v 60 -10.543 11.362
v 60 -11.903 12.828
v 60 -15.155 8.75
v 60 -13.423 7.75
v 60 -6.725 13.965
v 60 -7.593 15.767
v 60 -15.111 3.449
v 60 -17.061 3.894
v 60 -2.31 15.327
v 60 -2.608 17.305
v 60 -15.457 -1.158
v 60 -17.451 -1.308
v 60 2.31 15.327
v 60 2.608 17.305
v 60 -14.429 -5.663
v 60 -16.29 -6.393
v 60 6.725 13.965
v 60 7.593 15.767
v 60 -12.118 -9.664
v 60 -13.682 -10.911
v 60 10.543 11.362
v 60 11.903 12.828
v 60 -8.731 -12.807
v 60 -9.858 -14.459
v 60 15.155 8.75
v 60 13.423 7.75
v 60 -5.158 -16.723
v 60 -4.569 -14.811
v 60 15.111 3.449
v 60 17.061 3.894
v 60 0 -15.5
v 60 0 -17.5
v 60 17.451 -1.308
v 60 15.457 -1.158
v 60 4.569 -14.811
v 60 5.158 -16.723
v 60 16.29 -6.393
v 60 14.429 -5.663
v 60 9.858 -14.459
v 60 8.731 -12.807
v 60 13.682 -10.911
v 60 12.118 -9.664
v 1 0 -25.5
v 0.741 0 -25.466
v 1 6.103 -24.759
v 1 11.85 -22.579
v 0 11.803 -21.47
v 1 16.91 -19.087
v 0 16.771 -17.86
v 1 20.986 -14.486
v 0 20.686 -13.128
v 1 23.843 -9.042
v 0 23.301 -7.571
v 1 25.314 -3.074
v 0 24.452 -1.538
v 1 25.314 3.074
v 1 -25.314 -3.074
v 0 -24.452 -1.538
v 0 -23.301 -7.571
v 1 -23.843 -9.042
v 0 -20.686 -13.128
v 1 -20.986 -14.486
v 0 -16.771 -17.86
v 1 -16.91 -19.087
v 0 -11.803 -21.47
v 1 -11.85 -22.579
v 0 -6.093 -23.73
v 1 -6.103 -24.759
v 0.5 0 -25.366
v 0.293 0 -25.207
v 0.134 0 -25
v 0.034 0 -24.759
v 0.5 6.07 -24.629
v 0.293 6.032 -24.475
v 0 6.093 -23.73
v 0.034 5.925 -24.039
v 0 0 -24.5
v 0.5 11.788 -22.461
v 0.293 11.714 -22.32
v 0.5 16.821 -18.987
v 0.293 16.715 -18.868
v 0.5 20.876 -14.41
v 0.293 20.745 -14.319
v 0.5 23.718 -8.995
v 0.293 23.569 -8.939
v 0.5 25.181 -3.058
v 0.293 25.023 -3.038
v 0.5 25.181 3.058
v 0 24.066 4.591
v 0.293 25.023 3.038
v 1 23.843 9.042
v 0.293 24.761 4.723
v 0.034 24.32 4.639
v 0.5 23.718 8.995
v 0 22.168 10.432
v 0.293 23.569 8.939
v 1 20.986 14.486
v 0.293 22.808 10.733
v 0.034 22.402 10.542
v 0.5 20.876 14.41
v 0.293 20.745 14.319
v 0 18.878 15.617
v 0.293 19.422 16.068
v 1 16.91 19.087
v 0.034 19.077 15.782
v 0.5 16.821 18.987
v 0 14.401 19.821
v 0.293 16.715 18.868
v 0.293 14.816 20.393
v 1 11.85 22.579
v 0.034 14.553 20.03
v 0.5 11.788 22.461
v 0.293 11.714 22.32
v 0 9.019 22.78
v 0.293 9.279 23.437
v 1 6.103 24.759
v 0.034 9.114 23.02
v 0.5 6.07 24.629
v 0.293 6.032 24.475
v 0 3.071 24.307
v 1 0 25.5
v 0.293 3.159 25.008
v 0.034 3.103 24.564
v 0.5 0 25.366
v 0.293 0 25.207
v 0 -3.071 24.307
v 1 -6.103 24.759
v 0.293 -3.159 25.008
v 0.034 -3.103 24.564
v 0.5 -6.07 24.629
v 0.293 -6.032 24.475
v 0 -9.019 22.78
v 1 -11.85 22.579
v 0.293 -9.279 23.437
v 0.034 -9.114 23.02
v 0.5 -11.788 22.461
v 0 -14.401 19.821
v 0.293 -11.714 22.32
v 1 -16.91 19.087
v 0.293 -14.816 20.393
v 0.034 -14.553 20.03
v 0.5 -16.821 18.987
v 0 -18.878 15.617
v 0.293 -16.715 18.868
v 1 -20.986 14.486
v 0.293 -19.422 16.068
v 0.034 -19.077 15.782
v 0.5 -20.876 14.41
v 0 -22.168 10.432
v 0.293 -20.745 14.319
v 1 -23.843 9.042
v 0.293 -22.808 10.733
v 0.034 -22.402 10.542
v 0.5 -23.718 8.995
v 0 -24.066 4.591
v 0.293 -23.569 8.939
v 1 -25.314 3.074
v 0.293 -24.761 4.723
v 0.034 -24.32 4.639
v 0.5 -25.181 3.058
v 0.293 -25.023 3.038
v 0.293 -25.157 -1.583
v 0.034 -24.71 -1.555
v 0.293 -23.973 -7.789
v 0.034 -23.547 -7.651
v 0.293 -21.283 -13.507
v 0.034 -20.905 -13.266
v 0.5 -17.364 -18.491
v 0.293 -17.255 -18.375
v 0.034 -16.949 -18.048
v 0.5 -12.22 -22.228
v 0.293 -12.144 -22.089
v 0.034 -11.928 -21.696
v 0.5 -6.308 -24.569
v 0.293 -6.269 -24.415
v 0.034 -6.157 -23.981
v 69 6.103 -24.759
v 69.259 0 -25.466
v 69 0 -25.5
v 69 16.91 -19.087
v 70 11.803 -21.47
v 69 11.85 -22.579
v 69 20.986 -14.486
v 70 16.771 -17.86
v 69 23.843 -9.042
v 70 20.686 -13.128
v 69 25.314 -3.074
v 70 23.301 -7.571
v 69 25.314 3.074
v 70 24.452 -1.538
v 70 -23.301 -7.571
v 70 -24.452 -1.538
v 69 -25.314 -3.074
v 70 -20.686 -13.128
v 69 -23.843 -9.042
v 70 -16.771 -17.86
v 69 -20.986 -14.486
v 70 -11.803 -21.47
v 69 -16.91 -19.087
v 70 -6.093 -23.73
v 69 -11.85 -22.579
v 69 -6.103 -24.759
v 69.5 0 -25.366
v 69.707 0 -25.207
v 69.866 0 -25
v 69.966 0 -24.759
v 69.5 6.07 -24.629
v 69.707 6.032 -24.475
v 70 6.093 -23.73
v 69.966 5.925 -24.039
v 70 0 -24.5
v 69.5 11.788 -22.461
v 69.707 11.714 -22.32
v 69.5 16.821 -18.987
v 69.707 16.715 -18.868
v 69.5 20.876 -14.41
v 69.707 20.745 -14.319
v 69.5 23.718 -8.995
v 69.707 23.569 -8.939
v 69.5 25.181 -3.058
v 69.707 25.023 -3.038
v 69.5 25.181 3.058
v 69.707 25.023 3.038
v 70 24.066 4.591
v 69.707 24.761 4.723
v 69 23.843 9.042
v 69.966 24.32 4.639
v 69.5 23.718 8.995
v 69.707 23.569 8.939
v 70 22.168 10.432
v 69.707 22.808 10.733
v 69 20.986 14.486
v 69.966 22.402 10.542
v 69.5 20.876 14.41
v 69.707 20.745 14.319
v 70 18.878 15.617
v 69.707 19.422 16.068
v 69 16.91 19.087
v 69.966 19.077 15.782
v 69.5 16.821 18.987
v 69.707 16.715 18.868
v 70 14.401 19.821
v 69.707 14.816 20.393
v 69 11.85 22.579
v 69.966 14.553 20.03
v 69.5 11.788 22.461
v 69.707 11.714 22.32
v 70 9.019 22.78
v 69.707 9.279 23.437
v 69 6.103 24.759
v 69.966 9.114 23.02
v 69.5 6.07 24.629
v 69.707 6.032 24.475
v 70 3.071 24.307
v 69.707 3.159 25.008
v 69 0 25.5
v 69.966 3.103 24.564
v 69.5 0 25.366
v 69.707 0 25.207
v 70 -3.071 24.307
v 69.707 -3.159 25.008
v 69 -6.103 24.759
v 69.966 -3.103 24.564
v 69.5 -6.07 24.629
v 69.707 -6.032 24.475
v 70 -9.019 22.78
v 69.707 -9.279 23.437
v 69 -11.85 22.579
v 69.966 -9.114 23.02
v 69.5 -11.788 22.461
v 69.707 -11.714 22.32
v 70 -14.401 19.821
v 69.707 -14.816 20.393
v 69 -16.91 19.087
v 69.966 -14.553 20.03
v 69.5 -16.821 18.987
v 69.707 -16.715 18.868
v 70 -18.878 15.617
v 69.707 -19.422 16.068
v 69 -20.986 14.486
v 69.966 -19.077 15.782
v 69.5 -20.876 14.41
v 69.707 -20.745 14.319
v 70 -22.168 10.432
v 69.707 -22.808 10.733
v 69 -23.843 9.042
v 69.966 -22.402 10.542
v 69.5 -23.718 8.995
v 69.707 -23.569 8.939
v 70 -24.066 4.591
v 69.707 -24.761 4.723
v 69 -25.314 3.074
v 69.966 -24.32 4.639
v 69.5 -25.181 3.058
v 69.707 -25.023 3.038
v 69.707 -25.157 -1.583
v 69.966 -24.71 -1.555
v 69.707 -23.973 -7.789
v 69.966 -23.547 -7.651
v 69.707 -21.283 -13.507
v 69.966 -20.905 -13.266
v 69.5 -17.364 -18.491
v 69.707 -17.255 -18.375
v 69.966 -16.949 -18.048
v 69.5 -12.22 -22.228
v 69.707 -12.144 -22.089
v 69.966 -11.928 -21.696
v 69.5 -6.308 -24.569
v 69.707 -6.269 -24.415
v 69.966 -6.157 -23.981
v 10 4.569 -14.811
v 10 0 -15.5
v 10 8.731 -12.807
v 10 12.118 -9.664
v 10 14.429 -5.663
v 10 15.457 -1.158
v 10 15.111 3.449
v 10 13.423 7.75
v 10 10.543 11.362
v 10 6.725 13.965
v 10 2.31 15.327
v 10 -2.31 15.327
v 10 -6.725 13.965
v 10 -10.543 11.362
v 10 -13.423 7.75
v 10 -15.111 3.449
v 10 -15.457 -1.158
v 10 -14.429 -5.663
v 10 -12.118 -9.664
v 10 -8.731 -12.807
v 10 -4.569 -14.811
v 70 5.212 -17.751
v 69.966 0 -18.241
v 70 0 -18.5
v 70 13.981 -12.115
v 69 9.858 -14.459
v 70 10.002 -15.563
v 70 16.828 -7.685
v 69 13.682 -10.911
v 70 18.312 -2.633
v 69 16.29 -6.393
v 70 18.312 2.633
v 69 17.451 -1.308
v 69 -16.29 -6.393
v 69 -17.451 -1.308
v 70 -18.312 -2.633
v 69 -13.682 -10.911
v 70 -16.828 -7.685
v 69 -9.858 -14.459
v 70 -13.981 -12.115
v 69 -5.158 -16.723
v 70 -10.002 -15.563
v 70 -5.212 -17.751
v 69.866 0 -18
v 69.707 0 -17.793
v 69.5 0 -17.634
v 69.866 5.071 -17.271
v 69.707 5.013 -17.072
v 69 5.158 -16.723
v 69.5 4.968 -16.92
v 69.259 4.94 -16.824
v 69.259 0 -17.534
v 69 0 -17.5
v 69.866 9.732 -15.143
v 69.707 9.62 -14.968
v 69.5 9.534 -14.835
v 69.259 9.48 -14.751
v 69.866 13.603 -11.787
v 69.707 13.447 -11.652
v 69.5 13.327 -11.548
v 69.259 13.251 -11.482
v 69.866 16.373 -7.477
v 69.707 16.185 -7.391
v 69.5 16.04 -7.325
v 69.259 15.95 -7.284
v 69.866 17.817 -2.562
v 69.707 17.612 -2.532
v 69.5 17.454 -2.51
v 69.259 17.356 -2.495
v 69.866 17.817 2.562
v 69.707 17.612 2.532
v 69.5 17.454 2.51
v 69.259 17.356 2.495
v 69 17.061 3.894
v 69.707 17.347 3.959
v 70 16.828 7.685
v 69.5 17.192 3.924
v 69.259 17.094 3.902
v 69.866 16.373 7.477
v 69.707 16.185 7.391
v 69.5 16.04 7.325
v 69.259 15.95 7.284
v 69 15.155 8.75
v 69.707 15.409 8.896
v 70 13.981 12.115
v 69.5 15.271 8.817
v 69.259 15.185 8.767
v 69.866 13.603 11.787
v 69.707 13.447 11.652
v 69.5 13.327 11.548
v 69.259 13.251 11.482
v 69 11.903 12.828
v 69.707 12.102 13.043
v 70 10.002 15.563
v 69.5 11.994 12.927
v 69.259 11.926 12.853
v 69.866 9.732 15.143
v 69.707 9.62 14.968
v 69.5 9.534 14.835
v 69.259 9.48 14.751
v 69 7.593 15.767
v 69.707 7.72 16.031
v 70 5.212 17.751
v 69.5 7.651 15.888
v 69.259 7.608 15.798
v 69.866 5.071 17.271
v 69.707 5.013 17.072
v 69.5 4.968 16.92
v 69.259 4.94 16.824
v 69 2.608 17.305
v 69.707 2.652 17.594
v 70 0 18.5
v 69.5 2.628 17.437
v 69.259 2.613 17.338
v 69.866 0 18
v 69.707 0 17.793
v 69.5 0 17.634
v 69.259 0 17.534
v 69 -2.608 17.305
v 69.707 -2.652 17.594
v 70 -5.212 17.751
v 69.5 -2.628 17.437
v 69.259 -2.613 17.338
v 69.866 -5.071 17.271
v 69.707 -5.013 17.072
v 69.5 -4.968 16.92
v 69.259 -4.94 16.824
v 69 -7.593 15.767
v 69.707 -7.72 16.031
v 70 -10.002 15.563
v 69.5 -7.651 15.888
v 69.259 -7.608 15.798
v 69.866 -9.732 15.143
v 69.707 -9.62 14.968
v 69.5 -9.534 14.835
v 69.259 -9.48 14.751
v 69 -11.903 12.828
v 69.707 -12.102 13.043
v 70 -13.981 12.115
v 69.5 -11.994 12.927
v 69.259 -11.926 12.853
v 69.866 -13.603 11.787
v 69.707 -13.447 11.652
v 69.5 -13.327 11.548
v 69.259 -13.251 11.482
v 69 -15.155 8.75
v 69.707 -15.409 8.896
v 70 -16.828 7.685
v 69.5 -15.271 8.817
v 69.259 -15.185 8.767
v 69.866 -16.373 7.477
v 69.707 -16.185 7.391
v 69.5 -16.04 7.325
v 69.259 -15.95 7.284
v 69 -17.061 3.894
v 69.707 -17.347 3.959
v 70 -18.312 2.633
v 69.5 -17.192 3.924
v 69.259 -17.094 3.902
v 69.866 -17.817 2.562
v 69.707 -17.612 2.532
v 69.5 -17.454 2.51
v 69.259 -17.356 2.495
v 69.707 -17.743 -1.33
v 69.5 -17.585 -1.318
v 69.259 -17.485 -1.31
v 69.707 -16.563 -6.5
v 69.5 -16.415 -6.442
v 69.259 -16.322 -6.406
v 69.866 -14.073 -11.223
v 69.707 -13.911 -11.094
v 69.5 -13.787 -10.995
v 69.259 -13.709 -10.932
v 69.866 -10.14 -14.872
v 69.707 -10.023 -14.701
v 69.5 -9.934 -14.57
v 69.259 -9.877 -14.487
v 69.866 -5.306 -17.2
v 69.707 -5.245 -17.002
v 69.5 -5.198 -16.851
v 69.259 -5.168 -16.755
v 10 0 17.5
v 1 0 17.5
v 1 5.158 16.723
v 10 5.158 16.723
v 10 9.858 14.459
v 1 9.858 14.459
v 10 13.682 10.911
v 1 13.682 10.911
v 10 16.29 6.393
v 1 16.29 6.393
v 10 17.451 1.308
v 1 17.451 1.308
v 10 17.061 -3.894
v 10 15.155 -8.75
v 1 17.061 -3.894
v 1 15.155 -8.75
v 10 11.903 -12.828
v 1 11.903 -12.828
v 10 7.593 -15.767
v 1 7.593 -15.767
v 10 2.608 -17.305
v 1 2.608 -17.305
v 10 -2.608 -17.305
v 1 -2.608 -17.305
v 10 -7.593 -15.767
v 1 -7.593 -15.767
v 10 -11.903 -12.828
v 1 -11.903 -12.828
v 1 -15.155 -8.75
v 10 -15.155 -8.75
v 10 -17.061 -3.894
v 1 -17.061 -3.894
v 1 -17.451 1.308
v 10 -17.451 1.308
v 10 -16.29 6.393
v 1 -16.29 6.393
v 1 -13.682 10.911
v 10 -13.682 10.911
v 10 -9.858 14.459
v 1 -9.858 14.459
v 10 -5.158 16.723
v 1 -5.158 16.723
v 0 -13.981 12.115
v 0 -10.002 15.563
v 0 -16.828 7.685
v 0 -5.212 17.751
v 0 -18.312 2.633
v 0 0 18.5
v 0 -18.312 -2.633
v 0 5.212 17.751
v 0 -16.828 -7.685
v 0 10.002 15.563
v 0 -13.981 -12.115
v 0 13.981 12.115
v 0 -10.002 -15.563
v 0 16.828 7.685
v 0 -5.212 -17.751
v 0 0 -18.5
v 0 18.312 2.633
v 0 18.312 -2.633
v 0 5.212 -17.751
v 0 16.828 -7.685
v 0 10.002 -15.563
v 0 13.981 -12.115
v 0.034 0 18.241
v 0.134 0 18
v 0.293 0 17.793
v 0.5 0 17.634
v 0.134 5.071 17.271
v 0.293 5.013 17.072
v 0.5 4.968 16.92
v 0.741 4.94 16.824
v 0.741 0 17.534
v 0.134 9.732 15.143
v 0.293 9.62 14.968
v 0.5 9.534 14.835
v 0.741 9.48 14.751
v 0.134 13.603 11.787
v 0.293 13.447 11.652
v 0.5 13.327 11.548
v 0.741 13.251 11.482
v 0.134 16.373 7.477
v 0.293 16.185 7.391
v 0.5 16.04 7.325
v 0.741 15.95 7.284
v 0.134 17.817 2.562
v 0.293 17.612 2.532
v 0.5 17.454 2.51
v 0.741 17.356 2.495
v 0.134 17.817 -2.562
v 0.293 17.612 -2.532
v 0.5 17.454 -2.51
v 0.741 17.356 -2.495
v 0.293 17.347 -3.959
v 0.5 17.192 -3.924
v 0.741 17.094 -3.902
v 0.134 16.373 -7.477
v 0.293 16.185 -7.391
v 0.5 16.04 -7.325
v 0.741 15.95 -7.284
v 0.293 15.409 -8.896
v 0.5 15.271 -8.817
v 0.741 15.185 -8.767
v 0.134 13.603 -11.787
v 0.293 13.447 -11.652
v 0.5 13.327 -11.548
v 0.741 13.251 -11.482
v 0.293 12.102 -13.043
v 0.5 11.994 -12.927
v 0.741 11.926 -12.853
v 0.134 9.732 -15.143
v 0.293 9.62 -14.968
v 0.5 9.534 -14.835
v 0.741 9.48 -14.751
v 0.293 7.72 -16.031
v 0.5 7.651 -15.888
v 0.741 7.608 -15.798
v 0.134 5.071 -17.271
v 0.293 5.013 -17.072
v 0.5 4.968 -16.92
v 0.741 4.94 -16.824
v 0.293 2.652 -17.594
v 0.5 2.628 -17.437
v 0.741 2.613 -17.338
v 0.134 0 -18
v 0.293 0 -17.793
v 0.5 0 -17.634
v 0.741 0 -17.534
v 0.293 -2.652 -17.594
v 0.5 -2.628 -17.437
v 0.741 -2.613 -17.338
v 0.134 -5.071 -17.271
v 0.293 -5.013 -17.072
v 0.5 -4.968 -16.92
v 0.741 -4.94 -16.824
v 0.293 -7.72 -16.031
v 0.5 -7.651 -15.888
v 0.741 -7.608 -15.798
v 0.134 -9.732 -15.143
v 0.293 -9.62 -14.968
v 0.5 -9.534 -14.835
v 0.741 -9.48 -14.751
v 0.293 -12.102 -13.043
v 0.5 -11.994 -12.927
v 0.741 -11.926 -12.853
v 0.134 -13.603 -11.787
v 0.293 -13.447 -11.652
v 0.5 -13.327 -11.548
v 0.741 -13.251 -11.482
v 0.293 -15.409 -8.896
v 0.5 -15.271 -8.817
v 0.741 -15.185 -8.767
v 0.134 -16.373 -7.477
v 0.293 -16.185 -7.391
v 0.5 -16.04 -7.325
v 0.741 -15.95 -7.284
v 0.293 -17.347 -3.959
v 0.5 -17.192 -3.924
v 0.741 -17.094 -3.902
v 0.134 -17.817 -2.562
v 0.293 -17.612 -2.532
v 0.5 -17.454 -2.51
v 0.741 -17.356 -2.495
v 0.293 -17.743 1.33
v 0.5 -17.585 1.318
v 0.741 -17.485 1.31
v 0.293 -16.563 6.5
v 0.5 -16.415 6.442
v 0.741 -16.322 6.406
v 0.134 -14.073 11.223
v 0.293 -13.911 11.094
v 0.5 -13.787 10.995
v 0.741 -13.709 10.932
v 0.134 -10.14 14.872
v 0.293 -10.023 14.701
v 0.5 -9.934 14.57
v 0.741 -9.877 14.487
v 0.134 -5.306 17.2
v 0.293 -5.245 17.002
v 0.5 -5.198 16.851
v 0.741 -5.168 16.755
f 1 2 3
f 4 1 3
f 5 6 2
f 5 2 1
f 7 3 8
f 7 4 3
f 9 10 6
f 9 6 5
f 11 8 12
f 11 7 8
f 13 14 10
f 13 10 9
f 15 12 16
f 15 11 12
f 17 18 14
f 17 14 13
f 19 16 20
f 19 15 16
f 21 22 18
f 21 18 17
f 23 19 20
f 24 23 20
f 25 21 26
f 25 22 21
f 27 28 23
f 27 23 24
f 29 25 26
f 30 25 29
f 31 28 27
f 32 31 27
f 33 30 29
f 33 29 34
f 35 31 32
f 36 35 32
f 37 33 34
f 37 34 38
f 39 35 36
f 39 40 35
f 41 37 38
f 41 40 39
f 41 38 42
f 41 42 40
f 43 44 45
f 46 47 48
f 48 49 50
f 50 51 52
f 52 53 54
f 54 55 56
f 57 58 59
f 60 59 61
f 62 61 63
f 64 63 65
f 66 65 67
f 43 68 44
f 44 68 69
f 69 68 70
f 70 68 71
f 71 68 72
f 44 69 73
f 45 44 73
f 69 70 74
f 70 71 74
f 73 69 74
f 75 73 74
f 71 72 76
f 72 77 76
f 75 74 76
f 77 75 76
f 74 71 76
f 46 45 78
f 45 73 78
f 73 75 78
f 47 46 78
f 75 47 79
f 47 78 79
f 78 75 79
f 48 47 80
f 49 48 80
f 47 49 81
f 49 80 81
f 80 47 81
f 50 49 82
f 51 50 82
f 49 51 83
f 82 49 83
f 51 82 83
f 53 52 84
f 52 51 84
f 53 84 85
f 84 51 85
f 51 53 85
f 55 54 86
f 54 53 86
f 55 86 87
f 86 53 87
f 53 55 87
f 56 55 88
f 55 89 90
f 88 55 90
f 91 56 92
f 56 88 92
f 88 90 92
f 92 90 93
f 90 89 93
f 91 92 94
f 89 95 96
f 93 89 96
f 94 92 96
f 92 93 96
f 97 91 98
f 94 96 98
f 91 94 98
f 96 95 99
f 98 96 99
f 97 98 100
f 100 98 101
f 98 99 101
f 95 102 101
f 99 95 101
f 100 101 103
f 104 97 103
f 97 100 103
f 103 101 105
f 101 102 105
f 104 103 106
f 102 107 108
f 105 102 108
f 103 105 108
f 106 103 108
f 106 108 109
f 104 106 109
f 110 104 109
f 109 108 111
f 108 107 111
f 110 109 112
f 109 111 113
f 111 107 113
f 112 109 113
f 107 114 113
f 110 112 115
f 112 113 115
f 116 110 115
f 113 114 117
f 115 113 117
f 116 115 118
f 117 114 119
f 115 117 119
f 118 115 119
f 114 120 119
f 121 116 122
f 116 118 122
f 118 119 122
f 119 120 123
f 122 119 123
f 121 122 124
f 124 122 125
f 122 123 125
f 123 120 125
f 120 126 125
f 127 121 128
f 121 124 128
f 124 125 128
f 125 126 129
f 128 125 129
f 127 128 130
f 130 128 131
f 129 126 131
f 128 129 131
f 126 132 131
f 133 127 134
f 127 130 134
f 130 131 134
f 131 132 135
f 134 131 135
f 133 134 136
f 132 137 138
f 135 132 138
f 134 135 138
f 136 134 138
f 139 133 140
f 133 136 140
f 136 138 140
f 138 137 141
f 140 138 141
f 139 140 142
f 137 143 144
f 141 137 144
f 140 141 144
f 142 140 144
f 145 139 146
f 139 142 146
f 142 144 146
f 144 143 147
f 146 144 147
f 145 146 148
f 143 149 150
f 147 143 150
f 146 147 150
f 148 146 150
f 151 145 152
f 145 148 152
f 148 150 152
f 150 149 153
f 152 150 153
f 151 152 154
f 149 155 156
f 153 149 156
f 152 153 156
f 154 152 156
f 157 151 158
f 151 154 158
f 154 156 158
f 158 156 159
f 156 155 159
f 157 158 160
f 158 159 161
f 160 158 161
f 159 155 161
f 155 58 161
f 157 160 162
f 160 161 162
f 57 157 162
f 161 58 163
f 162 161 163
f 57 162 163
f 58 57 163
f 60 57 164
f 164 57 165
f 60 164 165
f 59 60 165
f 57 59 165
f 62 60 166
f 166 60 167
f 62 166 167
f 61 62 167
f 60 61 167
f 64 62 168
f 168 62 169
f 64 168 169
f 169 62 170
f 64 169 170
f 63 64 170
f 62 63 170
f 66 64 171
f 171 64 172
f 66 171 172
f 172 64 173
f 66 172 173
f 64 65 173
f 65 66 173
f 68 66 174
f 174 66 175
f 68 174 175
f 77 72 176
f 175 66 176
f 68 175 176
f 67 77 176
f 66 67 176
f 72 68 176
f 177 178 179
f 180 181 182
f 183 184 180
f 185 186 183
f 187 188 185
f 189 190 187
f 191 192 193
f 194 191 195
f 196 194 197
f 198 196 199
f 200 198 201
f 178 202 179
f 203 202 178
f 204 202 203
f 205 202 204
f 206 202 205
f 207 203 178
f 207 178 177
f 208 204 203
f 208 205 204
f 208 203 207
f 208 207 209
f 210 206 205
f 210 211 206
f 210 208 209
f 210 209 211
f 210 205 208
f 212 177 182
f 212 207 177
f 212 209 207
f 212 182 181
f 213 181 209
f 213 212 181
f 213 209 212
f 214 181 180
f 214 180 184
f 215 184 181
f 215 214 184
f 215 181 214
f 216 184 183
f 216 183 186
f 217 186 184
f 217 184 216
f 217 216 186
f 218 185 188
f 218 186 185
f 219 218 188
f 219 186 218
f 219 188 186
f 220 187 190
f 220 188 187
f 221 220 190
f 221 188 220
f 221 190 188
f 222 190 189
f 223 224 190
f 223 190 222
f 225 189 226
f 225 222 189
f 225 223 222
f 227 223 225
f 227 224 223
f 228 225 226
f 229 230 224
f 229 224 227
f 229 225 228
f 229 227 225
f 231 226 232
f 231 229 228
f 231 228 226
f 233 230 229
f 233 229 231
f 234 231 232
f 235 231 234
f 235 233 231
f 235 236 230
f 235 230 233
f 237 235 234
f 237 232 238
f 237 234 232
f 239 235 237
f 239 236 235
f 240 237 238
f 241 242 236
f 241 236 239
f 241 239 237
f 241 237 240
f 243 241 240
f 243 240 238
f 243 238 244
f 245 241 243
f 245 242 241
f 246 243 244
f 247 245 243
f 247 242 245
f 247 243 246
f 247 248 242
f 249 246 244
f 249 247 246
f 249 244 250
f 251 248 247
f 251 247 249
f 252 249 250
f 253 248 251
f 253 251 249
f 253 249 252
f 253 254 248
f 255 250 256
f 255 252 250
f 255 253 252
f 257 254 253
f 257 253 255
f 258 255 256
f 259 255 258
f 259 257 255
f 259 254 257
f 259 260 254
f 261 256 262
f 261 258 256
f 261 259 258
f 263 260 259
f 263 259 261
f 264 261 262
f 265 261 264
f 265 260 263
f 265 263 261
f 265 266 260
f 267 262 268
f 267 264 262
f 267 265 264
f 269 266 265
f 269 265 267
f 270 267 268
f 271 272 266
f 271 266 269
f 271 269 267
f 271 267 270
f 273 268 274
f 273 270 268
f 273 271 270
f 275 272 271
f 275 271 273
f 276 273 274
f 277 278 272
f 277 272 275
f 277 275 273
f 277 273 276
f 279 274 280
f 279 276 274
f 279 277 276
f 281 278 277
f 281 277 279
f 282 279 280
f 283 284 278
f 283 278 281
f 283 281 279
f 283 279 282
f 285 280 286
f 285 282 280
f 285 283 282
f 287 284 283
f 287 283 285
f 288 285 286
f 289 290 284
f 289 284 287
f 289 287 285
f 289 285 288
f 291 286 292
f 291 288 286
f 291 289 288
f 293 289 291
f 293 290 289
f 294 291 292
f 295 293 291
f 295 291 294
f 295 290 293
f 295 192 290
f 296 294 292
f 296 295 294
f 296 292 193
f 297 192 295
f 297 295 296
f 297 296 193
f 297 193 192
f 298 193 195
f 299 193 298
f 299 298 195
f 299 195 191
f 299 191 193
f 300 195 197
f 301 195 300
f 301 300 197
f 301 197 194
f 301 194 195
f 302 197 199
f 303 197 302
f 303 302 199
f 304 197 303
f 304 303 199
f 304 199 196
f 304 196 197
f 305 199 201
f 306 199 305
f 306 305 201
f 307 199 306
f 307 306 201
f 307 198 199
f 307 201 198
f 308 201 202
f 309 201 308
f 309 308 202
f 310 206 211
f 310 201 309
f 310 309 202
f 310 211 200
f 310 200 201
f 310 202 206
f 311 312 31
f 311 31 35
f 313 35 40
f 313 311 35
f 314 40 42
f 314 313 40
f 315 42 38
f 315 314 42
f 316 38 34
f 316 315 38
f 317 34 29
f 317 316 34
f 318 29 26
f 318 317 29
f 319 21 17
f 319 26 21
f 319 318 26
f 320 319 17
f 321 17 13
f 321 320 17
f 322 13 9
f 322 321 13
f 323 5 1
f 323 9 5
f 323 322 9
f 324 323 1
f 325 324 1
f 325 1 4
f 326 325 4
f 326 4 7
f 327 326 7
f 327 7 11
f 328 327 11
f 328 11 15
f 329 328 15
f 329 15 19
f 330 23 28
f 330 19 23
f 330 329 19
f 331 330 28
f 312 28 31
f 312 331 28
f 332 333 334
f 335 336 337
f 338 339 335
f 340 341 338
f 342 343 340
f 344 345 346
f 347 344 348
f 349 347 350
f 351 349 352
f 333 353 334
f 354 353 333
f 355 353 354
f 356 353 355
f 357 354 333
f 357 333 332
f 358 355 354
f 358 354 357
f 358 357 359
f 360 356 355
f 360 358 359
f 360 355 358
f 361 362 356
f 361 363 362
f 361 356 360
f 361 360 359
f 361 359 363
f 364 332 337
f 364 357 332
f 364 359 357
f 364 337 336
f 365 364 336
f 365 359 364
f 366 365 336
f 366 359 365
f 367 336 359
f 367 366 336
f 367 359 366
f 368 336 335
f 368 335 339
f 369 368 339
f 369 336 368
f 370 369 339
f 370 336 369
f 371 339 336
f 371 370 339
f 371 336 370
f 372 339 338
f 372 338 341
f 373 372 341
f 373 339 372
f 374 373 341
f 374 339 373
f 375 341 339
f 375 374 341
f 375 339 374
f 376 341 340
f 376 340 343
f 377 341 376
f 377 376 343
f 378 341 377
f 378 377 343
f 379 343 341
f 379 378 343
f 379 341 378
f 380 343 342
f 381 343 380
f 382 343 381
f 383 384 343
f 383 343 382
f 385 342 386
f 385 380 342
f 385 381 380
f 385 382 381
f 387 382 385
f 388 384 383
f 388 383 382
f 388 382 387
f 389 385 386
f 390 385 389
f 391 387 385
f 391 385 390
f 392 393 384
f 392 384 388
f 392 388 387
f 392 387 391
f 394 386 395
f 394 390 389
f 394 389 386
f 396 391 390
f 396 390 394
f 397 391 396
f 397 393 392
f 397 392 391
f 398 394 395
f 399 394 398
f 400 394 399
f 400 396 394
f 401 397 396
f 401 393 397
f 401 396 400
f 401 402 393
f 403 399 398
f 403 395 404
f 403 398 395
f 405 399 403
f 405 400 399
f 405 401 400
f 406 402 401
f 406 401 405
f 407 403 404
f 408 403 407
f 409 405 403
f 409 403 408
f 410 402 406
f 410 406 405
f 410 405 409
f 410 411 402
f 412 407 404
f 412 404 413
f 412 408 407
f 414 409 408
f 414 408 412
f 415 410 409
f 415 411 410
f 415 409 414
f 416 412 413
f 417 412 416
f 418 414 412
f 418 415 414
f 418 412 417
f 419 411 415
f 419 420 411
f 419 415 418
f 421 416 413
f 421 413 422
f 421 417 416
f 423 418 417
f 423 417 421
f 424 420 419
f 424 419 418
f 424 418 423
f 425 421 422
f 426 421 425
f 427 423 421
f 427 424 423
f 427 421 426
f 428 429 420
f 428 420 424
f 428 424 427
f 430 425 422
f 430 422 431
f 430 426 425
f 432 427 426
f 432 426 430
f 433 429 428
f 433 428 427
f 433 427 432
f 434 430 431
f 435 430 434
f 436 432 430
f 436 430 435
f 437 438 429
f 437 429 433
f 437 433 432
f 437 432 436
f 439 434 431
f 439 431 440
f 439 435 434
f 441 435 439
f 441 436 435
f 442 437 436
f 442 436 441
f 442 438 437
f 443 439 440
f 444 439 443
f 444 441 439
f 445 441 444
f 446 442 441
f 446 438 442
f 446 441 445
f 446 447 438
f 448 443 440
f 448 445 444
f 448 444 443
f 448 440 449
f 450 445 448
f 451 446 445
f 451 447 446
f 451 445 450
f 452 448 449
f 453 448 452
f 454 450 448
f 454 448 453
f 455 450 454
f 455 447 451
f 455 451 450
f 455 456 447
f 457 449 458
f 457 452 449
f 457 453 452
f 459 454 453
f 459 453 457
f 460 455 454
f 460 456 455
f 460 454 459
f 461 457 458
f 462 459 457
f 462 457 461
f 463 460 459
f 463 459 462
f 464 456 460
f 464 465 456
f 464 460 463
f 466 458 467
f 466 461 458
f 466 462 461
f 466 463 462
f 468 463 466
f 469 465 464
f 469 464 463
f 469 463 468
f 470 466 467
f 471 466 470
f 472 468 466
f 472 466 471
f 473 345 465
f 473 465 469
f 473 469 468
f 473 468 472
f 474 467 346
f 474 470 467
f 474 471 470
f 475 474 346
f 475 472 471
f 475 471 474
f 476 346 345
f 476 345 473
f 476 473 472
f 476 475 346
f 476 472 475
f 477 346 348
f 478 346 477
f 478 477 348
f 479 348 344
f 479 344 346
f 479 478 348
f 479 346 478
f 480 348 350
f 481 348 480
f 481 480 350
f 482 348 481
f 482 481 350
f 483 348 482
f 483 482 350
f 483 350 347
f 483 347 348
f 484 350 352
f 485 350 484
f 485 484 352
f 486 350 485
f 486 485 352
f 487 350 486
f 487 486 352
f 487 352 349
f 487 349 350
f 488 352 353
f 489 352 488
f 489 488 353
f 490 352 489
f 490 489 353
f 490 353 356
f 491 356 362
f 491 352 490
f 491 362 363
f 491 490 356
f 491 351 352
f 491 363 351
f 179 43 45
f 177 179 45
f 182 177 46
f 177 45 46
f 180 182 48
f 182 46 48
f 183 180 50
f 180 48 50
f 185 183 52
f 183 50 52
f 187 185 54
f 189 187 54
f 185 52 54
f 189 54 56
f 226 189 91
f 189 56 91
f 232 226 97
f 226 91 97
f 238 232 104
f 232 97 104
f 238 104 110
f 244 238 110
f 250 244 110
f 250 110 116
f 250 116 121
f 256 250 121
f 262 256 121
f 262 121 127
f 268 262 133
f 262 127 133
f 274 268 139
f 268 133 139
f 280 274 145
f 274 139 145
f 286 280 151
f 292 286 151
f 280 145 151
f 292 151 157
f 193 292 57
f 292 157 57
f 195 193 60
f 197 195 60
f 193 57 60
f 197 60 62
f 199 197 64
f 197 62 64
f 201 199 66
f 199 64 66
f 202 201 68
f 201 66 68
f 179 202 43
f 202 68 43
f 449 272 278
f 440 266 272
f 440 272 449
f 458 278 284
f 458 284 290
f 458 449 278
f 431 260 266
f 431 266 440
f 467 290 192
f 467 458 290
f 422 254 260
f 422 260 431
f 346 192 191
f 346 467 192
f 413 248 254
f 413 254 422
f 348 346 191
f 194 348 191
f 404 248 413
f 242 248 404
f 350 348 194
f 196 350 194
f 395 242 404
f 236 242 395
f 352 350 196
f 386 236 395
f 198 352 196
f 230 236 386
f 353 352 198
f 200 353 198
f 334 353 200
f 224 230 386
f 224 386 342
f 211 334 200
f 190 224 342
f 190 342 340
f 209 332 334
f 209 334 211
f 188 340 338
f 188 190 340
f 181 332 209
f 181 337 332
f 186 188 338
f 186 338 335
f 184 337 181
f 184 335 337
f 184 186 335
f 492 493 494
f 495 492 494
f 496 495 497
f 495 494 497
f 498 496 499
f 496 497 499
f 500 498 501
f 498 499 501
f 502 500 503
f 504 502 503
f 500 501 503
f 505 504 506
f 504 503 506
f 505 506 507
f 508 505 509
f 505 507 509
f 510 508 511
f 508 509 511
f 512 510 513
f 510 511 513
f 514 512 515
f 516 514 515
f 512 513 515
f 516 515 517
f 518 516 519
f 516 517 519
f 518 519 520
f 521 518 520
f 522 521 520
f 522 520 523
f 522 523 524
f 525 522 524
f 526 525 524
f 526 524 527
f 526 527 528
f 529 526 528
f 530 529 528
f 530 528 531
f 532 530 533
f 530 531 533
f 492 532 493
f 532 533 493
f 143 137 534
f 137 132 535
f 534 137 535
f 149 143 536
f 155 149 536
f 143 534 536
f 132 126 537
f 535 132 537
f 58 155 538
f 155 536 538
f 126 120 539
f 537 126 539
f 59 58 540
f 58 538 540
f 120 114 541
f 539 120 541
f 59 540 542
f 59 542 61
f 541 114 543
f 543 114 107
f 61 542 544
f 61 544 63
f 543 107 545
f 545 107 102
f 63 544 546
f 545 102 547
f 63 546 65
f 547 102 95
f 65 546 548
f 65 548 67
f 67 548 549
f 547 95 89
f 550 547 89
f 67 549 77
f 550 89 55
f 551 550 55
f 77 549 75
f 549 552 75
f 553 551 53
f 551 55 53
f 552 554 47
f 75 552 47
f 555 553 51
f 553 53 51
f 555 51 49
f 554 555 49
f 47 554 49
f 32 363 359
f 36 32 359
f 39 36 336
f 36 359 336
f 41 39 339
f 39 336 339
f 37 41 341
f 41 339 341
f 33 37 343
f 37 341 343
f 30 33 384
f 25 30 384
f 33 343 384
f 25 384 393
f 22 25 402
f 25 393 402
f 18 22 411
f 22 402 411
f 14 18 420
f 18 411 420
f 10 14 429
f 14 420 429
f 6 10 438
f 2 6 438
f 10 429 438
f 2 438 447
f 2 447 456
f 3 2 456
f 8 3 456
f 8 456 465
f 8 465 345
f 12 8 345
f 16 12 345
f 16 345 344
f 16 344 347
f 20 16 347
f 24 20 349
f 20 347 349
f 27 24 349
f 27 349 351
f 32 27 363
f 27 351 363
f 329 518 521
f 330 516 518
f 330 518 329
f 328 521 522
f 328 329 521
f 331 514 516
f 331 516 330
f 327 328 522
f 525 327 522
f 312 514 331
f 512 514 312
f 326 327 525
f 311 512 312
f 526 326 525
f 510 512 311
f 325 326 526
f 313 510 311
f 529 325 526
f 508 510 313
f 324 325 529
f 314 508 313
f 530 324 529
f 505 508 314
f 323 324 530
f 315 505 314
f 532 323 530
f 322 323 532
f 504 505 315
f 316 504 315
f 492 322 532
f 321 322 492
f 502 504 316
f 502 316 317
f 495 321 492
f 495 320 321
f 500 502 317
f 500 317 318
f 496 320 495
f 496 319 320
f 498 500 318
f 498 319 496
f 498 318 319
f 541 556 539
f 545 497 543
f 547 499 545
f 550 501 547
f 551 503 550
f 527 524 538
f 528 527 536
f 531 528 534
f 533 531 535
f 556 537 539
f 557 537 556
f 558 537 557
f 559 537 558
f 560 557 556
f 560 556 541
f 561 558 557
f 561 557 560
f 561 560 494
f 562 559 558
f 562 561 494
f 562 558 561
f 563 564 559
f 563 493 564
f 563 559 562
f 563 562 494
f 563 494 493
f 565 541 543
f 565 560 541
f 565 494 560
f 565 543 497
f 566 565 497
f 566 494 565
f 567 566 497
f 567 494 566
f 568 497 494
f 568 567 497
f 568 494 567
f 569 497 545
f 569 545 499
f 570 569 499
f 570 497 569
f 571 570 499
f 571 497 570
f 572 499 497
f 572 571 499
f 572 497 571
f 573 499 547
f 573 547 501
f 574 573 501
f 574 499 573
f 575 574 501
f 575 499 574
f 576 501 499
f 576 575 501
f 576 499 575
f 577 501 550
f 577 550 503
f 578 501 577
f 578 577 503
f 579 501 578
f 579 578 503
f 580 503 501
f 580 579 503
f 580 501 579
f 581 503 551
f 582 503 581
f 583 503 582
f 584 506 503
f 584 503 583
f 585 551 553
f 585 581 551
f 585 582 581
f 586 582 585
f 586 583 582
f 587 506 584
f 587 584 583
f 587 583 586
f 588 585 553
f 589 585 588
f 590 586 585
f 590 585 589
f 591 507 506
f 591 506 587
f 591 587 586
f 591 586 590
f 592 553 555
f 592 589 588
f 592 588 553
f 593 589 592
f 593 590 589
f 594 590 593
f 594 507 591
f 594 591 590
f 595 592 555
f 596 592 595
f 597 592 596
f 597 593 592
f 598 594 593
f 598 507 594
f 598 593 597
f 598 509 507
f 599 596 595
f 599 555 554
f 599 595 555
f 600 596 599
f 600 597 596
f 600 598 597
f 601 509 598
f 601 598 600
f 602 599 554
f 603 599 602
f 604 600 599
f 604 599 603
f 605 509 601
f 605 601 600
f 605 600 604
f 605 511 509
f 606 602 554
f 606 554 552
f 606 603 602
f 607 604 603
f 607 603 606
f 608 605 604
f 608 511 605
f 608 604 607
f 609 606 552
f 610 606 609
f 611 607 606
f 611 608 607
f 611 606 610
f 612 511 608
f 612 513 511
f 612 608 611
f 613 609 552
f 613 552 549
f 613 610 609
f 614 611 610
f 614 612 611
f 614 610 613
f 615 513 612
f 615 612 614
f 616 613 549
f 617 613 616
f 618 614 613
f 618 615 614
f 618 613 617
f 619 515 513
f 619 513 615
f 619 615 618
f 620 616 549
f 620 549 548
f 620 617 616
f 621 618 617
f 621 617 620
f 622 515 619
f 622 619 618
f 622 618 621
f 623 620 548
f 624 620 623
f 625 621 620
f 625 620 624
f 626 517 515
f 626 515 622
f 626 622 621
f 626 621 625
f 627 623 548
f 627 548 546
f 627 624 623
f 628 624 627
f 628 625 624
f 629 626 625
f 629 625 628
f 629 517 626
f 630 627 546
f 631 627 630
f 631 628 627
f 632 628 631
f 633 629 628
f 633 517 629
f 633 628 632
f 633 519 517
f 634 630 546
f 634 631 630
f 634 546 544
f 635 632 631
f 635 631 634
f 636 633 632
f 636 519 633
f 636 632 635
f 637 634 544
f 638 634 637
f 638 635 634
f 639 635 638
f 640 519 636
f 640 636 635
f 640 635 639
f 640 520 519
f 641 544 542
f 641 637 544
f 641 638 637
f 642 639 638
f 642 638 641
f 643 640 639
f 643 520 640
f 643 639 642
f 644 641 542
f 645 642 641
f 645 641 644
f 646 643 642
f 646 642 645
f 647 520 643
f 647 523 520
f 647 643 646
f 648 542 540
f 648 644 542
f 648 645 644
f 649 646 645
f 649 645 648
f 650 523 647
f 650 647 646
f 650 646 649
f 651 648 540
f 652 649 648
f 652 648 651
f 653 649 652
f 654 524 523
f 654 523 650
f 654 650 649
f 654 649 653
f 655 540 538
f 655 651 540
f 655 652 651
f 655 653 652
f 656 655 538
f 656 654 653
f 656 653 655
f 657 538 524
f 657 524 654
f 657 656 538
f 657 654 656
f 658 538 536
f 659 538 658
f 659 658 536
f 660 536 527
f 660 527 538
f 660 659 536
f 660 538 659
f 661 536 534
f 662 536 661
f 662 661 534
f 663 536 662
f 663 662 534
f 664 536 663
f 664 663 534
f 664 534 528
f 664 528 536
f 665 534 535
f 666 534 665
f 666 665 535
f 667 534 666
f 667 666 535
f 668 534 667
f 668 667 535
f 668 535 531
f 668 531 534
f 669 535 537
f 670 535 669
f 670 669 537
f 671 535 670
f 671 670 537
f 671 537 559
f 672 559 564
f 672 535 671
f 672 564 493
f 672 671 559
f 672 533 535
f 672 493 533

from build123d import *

# Parameters (mm, degrees)
SKETCH2_R           = 25.5
SKETCH2_R_2         = 15.5
BOSS_EXTRUDE1_DEPTH = 70
SKETCH3_R           = 17.5
CUT_EXTRUDE1_DEPTH  = 10
SKETCH4_R           = 17.5
CUT_EXTRUDE2_DEPTH  = 10
FILLET1_R           = 1


with BuildPart() as part:
    # Sketch2 → Boss-Extrude1 (new body)
    with BuildSketch(Plane(origin=(0, 0, 0), x_dir=(0, 0, -1), z_dir=(1, 0, 0))):
        Circle(SKETCH2_R)
        Circle(SKETCH2_R_2, mode=Mode.SUBTRACT)
    extrude(amount=BOSS_EXTRUDE1_DEPTH)

    # Sketch3 → Cut-Extrude1 (cut)
    with BuildSketch(Plane(origin=(70, 0, 0), x_dir=(0, 0, -1), z_dir=(1, 0, 0))):
        Circle(SKETCH3_R)
    extrude(amount=-CUT_EXTRUDE1_DEPTH, mode=Mode.SUBTRACT)

    # Sketch4 → Cut-Extrude2 (cut)
    with BuildSketch(Plane.ZY):
        Circle(SKETCH4_R)
    extrude(amount=-CUT_EXTRUDE2_DEPTH, mode=Mode.SUBTRACT)

    # Fillet1
    fillet1_edges = [part.edges().sort_by_distance(p)[0] for p in [
        (70, 0, 17.5),
        (0, 0, -17.5),
        (0, 0, 25.5),
        (70, 0, 25.5),
    ]]
    fillet(fillet1_edges, radius=FILLET1_R)


solid = part.part
